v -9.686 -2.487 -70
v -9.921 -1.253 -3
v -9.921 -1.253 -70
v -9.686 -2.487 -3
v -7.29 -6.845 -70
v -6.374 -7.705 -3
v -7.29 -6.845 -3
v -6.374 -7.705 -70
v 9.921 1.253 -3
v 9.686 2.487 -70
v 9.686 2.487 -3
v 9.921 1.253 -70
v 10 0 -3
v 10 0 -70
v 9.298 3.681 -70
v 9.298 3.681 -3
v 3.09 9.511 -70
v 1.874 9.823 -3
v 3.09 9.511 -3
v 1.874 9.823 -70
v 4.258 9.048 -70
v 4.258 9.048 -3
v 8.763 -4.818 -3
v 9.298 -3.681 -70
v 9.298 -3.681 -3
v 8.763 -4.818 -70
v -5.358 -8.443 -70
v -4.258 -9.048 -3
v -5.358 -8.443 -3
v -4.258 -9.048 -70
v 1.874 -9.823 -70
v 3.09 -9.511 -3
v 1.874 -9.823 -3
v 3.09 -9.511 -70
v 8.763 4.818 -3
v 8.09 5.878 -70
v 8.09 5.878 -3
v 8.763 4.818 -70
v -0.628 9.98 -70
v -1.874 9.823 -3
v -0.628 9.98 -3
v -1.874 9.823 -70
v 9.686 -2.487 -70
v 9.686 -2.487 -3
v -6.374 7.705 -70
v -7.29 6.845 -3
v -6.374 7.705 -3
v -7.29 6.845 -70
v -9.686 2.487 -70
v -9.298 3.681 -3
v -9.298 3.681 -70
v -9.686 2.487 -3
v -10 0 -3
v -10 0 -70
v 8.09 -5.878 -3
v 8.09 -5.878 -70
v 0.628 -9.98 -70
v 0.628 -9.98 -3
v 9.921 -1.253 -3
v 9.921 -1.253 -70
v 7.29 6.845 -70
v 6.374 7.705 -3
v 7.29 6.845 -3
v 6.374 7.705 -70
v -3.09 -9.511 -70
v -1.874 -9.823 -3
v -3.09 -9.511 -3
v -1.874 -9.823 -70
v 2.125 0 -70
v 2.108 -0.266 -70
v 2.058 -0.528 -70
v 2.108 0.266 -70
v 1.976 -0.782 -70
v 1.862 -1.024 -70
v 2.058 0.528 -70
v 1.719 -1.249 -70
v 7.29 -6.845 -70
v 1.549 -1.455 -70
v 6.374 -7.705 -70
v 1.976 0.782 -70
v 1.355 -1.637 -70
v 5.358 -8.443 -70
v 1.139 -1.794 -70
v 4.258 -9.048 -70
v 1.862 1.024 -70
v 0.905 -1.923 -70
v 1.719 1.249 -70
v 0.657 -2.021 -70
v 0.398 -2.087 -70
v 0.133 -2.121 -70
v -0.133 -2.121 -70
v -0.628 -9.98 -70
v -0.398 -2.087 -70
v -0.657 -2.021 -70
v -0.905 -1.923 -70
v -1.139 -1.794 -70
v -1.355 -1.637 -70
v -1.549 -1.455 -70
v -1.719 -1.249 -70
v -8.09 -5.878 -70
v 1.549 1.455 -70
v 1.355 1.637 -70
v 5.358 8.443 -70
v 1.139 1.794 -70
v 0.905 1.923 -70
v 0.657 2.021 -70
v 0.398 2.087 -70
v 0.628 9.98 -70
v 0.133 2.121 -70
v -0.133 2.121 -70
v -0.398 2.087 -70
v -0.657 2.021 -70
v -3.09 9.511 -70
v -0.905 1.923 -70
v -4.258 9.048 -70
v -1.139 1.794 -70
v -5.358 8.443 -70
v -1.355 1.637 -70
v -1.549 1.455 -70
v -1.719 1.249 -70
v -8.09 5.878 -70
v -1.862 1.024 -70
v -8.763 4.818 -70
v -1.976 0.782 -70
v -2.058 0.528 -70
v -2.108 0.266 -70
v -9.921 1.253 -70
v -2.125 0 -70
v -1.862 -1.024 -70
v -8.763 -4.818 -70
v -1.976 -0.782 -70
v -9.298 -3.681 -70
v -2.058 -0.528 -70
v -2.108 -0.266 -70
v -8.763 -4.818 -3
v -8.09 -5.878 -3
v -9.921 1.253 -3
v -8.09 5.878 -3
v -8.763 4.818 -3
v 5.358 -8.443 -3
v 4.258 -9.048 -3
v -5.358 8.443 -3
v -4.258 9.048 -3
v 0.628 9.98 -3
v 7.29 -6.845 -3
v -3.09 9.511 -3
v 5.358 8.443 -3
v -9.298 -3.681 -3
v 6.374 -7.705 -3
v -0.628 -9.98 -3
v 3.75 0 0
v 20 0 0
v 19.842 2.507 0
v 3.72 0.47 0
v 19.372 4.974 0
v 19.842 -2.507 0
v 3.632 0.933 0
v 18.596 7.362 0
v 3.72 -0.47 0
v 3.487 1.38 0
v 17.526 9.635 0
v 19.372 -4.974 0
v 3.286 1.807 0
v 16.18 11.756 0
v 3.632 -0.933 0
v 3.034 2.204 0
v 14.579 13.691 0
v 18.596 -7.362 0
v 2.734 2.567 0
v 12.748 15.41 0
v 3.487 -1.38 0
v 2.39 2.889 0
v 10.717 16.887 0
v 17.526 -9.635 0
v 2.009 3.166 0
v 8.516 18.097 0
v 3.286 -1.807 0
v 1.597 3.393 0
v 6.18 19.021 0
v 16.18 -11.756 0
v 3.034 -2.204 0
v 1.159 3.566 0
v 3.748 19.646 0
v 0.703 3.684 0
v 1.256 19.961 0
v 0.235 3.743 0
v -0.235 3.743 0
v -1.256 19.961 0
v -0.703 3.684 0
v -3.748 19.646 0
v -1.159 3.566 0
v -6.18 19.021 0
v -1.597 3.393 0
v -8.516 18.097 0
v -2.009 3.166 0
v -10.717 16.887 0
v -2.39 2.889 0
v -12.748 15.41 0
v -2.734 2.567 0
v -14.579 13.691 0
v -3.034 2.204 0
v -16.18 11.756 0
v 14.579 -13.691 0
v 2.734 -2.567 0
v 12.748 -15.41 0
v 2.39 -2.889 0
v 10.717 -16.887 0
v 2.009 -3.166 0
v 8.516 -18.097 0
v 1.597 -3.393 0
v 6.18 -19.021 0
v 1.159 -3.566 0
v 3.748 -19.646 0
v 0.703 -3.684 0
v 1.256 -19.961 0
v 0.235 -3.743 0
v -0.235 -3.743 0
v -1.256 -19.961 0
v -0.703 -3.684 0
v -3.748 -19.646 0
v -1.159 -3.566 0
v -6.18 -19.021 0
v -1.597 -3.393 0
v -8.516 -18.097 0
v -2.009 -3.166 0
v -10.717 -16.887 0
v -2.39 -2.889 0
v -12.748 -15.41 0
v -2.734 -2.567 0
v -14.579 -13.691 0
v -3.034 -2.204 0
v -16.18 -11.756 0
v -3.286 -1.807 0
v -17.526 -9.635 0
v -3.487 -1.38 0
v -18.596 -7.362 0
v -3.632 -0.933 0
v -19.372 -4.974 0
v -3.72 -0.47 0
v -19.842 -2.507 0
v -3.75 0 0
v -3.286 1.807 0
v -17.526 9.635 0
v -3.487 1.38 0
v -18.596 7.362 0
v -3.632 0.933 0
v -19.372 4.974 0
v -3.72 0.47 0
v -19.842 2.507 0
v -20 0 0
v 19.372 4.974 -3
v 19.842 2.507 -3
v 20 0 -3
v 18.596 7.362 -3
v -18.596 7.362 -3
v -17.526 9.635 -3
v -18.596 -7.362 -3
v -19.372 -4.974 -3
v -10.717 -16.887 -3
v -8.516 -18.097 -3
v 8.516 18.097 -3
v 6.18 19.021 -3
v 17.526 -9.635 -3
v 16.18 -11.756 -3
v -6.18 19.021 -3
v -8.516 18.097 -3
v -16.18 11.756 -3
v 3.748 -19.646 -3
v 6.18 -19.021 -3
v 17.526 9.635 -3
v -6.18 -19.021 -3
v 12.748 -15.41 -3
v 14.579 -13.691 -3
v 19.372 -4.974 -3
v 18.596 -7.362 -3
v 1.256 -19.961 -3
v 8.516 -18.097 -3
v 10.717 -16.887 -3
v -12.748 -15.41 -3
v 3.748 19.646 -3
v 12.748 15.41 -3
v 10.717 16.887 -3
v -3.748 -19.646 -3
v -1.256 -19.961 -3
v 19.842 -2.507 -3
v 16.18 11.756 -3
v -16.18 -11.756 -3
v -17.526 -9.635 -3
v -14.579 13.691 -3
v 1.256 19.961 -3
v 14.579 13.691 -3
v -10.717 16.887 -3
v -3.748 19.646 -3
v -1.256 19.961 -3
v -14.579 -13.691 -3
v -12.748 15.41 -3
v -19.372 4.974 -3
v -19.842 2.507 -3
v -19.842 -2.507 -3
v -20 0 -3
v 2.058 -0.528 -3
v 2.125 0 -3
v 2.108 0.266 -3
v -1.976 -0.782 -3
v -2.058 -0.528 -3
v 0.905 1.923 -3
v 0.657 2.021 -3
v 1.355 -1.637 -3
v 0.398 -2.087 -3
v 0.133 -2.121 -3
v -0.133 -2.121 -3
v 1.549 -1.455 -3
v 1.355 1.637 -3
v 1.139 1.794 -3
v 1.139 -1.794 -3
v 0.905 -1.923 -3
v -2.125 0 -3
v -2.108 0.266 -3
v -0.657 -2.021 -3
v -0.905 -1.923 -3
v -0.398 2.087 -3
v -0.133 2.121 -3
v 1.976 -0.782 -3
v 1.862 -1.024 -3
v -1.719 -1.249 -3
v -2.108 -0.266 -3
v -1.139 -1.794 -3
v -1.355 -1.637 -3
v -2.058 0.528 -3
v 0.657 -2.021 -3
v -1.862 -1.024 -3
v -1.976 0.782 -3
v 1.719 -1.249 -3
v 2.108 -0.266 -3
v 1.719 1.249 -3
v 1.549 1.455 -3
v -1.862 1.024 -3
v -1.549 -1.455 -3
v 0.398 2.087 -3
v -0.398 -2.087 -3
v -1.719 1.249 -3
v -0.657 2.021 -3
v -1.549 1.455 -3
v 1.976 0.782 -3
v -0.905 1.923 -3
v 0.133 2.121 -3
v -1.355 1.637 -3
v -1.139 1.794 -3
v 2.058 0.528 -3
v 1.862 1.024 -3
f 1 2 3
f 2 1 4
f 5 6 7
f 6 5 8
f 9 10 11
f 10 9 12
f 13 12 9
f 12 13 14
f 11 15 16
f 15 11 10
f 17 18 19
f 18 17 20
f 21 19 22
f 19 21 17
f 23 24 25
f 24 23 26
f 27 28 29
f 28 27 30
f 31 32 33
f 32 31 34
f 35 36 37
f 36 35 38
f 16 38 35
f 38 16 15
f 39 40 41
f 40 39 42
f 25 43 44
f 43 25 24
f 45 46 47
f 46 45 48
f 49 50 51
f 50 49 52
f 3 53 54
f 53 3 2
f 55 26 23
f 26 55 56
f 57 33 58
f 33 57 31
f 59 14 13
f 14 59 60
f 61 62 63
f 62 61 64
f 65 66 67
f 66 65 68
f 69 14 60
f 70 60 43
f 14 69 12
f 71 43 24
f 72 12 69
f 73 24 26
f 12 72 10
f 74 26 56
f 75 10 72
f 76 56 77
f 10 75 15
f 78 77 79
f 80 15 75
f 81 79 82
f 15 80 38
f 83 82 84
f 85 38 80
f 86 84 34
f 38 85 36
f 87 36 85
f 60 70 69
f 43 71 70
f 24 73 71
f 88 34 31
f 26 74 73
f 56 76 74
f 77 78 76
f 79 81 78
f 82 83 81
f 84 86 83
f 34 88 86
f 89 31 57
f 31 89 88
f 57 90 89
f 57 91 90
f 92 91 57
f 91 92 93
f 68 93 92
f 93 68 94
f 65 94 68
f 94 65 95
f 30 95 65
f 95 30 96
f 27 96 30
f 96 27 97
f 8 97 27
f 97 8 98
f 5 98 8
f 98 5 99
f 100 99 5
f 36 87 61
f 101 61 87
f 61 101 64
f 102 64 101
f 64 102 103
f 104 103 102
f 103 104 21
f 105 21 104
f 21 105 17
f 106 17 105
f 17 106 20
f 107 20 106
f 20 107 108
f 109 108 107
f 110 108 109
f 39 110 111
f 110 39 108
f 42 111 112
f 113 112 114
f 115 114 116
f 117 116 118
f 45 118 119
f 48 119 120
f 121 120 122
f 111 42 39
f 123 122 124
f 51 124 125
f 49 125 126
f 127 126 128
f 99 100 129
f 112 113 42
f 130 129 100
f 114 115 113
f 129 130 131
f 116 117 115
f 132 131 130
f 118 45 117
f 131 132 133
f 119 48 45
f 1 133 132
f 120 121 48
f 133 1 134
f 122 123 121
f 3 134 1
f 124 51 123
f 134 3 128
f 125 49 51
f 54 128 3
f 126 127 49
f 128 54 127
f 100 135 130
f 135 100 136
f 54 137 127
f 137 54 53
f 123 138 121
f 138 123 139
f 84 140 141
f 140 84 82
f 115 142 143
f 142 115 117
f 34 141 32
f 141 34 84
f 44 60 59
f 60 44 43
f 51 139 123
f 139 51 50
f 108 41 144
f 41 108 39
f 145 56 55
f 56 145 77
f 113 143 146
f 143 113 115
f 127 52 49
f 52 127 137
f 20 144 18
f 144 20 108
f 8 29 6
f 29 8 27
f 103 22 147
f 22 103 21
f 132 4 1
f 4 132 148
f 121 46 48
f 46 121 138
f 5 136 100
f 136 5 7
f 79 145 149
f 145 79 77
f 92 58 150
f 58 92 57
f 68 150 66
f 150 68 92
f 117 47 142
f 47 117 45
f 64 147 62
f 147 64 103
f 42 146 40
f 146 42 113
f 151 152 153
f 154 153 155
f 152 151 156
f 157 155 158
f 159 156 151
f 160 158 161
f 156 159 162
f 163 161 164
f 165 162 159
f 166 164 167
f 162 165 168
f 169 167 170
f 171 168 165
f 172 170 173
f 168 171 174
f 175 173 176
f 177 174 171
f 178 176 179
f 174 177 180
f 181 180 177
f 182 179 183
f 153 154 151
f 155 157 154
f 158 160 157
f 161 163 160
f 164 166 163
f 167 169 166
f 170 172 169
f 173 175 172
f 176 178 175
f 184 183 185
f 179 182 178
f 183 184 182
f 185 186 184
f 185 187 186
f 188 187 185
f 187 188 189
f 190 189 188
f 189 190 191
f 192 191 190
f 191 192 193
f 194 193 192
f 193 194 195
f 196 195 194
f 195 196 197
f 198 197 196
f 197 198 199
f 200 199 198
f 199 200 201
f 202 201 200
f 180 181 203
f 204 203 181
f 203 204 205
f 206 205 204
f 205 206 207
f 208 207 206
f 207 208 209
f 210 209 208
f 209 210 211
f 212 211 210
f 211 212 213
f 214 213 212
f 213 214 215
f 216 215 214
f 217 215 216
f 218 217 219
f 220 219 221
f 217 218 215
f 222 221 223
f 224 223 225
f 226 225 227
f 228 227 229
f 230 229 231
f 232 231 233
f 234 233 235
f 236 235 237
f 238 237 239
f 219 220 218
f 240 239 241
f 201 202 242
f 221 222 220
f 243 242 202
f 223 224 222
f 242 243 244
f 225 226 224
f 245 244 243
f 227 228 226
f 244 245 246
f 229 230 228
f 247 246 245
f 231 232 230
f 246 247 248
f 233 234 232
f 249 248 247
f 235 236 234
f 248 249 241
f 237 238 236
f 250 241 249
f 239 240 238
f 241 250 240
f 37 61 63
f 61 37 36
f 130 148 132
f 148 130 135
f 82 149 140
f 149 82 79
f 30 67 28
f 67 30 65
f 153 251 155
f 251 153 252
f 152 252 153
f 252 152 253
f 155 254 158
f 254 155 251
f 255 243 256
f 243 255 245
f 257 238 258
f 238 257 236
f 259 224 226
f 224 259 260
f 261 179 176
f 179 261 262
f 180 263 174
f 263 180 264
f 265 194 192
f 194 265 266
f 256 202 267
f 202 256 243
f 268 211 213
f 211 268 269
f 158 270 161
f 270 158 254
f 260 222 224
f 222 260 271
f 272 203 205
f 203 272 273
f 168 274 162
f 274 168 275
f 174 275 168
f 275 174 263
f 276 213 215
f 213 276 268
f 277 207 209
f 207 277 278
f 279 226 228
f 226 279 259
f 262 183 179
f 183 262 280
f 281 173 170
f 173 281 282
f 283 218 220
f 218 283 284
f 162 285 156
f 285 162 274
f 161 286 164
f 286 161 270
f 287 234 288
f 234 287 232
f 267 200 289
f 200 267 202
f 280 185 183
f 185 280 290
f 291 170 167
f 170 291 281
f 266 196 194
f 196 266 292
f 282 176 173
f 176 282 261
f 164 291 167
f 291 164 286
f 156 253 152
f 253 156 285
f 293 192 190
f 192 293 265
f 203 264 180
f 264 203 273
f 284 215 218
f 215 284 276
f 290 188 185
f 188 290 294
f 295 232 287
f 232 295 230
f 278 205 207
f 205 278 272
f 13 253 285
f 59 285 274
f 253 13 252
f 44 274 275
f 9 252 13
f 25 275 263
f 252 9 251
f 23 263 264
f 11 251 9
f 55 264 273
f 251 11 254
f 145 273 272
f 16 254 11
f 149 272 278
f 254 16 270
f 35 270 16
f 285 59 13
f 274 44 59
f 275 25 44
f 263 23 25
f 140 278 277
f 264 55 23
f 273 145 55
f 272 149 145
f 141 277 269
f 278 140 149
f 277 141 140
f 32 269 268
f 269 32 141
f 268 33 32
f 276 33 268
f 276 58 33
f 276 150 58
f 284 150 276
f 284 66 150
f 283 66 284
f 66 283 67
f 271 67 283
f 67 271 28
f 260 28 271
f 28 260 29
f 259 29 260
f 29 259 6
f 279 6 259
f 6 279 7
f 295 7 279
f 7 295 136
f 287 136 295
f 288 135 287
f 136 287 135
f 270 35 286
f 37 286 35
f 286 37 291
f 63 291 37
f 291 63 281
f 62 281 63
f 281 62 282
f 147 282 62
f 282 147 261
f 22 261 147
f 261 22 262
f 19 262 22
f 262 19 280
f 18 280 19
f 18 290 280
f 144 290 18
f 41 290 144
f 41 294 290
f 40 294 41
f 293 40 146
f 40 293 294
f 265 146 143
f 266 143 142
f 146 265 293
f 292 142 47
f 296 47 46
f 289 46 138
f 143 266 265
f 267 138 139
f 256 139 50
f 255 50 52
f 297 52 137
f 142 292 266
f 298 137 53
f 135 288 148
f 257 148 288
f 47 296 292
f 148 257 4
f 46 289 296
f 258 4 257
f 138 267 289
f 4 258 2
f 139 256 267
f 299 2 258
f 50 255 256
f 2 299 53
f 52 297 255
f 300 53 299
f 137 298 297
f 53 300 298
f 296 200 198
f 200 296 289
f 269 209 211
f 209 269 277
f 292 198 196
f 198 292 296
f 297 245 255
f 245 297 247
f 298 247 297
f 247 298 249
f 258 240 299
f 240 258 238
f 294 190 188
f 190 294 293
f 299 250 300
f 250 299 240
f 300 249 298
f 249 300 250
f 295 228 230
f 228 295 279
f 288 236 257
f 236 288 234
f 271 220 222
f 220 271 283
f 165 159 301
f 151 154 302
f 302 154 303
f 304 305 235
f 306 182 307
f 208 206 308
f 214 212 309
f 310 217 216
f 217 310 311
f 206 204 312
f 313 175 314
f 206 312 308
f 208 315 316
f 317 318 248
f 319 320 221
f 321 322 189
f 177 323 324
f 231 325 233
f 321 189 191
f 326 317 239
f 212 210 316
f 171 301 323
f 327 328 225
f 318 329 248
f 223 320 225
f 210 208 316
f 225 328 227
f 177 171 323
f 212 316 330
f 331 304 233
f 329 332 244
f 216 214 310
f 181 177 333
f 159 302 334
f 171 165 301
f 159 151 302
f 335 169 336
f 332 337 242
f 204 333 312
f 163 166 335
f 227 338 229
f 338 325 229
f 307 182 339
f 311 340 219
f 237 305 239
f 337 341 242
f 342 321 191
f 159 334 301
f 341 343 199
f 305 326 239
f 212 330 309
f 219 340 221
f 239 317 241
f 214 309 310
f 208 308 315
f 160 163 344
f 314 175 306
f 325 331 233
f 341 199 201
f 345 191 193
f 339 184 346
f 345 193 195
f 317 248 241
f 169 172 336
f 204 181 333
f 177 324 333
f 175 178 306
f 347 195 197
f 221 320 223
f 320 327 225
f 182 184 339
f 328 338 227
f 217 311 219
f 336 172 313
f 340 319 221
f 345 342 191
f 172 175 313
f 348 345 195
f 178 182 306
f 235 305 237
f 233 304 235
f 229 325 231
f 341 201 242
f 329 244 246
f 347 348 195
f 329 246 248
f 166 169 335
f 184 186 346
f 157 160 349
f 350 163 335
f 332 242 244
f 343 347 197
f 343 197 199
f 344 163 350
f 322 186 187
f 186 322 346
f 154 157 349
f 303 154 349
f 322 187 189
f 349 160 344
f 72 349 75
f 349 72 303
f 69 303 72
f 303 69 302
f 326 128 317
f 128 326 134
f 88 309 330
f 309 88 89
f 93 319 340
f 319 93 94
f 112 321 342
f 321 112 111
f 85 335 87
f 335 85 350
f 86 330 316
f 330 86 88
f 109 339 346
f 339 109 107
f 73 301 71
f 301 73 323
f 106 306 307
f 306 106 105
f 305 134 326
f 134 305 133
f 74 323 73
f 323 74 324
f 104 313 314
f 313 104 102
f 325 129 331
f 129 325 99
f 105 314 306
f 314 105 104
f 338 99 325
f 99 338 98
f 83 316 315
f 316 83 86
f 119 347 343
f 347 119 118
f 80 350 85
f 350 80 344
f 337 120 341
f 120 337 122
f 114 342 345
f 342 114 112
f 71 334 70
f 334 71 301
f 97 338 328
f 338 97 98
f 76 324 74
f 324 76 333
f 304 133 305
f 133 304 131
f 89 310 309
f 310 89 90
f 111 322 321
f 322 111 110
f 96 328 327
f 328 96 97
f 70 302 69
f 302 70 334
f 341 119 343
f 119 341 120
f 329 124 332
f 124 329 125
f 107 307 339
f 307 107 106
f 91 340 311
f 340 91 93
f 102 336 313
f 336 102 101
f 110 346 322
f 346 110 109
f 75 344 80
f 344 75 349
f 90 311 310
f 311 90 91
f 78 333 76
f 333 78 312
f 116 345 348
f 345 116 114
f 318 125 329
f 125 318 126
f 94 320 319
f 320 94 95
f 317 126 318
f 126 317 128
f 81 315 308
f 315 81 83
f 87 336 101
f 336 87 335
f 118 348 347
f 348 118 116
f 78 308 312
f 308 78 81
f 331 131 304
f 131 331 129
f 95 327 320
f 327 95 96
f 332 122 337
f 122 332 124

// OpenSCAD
$fn = 50;


difference() {
	union() {
		translate(v = [0, 0, -70.0000000000]) {
			cylinder(h = 70, r = 10.0000000000);
		}
		translate(v = [0, 0, -3.0000000000]) {
			cylinder(h = 3, r = 20.0000000000);
		}
	}
	union() {
		translate(v = [0, 0, 0]) {
			rotate(a = [0, 0, 0]) {
				difference() {
					union() {
						#translate(v = [0, 0, -70.0000000000]) {
							cylinder(h = 70, r = 2.0000000000);
						}
						#translate(v = [0, 0, -3]) {
							cylinder(h = 3, r = 10.0000000000, r1 = 2.1250000000, r2 = 3.7500000000);
						}
						#translate(v = [0, 0, -70.0000000000]) {
							cylinder(h = 70, r = 2.1250000000);
						}
						#translate(v = [0, 0, -70.0000000000]) {
							cylinder(h = 70, r = 2.0000000000);
						}
					}
					union();
				}
			}
		}
	}
}
